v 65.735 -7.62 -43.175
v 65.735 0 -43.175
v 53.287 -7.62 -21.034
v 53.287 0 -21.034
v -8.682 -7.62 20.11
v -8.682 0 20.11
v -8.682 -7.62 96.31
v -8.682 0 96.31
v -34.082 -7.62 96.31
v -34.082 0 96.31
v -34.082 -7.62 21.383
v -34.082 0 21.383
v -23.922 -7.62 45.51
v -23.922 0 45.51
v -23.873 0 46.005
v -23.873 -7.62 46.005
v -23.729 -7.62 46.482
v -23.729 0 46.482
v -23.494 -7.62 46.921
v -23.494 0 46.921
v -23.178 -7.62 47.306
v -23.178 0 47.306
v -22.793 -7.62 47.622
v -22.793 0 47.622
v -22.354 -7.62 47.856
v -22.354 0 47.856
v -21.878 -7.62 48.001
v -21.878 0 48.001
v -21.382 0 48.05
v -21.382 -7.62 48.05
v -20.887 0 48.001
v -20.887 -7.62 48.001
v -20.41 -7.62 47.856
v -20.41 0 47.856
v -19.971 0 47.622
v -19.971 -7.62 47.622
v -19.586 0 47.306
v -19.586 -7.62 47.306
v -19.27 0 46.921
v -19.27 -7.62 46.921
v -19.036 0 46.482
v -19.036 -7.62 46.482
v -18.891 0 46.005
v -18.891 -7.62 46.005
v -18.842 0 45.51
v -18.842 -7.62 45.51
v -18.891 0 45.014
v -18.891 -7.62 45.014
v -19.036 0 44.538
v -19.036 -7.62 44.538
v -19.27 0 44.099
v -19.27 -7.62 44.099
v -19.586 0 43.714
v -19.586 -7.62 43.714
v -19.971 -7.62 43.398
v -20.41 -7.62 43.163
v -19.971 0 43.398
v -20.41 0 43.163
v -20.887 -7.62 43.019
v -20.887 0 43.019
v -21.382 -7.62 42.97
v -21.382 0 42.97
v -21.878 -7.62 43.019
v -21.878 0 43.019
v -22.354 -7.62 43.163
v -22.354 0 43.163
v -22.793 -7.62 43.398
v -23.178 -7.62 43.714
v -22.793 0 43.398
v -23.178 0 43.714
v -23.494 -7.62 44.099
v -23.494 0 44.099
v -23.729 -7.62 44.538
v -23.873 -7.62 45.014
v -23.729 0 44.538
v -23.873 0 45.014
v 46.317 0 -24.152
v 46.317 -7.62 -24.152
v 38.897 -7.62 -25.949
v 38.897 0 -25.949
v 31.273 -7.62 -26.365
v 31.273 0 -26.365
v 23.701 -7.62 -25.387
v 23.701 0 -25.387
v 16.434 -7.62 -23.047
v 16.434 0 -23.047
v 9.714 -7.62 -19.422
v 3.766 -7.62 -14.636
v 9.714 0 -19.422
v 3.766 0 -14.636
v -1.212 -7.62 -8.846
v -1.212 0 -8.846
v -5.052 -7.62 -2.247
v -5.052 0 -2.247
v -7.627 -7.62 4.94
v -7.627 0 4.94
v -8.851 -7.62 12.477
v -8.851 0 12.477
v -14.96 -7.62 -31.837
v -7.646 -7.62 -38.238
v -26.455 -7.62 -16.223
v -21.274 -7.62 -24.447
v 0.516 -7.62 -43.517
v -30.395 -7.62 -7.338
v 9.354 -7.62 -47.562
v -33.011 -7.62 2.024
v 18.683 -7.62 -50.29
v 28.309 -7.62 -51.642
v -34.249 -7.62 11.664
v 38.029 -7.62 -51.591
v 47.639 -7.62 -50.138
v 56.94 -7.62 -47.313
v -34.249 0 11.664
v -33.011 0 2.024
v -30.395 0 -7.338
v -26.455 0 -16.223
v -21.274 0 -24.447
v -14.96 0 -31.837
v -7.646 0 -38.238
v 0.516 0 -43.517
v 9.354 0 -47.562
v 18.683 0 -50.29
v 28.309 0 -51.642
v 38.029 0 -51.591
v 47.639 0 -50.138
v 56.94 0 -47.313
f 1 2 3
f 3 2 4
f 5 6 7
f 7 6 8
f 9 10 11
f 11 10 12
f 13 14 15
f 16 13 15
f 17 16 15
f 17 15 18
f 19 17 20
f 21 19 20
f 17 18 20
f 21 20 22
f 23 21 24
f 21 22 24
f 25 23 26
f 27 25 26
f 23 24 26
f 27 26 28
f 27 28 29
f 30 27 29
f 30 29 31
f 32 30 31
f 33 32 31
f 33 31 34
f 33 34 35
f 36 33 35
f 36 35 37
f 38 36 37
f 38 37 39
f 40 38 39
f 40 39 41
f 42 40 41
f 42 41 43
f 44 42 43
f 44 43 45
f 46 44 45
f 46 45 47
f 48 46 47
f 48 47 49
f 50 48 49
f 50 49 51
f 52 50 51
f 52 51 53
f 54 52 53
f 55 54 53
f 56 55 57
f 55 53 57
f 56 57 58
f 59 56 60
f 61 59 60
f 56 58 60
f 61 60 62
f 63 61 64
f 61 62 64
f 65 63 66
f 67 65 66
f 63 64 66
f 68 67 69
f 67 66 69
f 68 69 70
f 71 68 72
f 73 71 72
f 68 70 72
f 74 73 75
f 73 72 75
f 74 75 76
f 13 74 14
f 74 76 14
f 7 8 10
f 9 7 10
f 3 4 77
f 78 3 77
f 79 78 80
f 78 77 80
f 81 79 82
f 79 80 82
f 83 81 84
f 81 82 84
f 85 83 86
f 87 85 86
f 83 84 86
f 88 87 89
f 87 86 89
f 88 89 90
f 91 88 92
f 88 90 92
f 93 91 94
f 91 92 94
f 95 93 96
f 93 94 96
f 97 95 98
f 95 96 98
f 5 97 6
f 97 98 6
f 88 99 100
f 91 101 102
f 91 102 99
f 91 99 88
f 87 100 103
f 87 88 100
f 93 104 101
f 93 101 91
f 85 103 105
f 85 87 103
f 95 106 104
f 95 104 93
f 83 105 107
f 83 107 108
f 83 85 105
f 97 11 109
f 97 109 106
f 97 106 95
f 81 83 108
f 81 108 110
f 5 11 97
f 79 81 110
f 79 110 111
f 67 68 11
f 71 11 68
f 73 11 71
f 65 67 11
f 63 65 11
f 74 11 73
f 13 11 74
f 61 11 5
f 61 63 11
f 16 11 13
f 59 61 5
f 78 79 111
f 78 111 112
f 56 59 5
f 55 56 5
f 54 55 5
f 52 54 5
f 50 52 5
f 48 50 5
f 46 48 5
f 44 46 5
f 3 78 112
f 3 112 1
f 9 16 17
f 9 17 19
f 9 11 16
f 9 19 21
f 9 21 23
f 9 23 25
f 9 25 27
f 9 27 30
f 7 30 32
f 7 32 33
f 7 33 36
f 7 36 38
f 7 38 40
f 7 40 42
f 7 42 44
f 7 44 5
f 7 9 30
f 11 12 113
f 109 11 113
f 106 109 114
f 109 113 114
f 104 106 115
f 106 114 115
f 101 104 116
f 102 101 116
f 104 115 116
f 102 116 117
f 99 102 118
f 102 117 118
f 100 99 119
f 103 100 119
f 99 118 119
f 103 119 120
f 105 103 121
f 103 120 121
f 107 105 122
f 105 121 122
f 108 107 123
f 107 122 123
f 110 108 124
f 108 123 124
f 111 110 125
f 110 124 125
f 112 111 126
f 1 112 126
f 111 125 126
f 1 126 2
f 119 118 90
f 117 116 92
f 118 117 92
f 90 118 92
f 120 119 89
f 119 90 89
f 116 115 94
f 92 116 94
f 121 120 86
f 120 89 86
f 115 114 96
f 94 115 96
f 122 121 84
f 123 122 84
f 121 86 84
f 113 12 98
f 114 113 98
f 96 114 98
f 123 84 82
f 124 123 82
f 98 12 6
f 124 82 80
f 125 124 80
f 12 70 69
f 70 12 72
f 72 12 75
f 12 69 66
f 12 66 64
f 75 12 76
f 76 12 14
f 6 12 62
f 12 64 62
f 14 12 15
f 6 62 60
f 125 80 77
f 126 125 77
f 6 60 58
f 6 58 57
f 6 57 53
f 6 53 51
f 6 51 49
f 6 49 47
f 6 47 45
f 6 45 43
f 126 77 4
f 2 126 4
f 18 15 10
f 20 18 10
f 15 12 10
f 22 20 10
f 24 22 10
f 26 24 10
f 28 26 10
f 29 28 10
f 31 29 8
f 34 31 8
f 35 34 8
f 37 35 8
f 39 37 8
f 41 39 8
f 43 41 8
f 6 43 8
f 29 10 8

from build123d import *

# Parameters (mm, degrees)
F1_DEPTH = 7.62
F3_D     = 5.08


with BuildPart() as f1:
    # F0 (on Front) → F1 (new body)
    with BuildSketch(Plane.XZ):
        with BuildLine():
            ThreePointArc((53.286768, -21.034017), (9.713758, -19.422437), (-8.682193, 20.109746))
            Line((-8.682193, 20.109746), (-34.082193, 20.109746))
            Line((-34.082193, 20.109746), (-34.082193, 21.38293))
            ThreePointArc((-34.082193, 21.38293), (-3.66046, -41.025575), (65.734673, -43.174696))
            Line((65.734673, -43.174696), (53.286768, -21.034017))
        make_face()
        Polygon((-34.082193, 20.109746), (-8.682193, 20.109746), (-8.682193, 96.309746), (-34.082193, 96.309746), (-34.082193, 21.38293), align=None)
    extrude(amount=F1_DEPTH)

    # F3 (through all)
    with Locations(Plane.XZ.offset(7.62)):
        with Locations((-21.382193, 45.509746)):
            Hole(F3_D / 2)


solid = f1.part
